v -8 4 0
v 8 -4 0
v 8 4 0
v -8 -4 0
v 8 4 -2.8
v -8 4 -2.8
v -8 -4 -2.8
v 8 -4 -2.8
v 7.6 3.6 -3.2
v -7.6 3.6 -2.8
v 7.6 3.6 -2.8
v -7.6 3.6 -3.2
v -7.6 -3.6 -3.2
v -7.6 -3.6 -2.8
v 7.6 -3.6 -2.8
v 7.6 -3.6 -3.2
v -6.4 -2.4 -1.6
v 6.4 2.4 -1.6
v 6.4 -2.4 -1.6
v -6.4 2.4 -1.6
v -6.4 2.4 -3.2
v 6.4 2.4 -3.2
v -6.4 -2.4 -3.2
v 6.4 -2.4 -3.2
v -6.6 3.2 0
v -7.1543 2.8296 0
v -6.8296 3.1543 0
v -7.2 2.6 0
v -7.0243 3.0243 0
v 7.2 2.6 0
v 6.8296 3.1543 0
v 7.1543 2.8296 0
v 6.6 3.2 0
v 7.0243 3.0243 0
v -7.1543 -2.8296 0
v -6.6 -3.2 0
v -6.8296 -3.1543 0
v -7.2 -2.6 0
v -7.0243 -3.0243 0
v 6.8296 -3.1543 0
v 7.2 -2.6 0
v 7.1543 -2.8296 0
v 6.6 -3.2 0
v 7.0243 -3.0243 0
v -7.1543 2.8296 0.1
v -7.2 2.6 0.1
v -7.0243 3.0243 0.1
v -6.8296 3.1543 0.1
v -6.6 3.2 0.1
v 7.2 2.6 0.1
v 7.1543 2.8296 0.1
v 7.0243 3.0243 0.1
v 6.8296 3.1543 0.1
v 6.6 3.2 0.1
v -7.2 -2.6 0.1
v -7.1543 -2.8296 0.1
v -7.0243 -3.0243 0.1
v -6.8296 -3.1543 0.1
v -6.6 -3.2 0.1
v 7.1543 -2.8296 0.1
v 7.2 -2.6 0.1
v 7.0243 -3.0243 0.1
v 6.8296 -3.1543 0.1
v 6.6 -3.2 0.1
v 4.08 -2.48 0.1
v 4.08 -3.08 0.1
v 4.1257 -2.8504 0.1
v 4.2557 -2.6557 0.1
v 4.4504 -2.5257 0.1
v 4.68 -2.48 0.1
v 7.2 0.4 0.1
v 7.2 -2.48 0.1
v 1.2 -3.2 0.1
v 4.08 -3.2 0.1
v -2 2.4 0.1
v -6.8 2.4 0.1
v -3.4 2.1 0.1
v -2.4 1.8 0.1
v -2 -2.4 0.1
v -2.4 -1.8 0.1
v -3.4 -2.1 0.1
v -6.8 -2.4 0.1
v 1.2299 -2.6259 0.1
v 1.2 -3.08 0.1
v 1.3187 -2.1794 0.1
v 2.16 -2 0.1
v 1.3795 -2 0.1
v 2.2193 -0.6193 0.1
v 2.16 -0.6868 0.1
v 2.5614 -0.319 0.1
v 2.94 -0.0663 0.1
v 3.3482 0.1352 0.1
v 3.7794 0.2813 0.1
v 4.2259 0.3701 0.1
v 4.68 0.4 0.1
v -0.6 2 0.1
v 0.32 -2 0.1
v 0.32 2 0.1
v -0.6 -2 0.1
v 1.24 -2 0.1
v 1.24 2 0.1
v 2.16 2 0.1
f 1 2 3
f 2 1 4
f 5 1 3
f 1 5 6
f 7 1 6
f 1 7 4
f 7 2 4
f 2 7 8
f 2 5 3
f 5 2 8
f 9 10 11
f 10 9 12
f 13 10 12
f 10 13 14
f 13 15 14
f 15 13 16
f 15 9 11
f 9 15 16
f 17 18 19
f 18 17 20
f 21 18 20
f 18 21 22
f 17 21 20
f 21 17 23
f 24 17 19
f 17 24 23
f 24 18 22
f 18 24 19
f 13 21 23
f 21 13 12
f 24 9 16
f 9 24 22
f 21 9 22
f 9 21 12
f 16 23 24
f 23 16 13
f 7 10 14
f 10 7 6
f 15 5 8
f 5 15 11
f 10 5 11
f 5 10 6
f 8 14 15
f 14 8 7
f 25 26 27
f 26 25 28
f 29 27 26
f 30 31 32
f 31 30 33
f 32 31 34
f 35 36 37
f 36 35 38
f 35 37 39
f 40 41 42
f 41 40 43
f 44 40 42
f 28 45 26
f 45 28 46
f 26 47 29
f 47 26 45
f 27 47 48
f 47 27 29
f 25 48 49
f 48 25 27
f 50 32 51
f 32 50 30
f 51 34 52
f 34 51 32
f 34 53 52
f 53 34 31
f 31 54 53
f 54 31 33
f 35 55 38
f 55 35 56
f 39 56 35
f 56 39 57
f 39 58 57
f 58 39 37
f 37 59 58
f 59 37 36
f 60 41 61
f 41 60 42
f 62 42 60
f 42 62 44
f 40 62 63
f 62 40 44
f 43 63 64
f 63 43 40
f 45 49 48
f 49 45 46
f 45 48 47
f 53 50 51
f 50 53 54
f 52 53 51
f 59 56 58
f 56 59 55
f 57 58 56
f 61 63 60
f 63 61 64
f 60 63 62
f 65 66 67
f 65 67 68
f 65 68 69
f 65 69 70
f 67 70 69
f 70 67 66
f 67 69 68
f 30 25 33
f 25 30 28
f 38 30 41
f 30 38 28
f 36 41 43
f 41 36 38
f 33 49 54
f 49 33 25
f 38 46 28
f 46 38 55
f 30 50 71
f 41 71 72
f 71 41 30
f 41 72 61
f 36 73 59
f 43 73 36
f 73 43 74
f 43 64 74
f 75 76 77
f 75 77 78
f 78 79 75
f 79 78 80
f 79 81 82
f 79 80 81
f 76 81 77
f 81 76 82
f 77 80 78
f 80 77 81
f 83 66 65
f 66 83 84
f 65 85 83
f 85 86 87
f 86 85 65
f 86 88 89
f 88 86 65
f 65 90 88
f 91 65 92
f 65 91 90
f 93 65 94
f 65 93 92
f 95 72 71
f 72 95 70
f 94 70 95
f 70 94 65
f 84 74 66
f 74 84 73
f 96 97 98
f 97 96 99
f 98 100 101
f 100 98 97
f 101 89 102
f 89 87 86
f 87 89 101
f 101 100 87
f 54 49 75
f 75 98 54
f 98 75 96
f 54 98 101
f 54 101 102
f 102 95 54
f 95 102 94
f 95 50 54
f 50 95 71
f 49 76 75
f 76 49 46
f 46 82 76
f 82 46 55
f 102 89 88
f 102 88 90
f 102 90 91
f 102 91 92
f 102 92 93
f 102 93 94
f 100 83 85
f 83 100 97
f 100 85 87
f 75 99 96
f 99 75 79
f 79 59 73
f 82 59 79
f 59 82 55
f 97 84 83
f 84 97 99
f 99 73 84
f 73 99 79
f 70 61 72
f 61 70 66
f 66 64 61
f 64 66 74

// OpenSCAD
// file: ../p/box5.scad
use <../lib.scad>
function ldraw_lib__box5() = [
// 0 Box with 5 Faces and All Edges
// 0 Name: box5.dat
// 0 Author: James Jessiman
// 0 !LDRAW_ORG Primitive UPDATE 2012-01
// 0 !LICENSE Licensed under CC BY 4.0 : see CAreadme.txt
// 
// 0 BFC CERTIFY CCW
  [0,"BFC","CERTIFY"],
  [0,"BFC","CCW"],
// 
// 0 !HISTORY 2002-04-03 [sbliss] Modified for BFC compliance
// 0 !HISTORY 2002-04-25 [PTadmin] Official Update 2002-02
// 0 !HISTORY 2007-06-24 [PTadmin] Header formatted for Contributor Agreement
// 0 !HISTORY 2008-07-01 [PTadmin] Official Update 2008-01
// 0 !HISTORY 2012-02-16 [Philo] Changed to CCW
// 0 !HISTORY 2012-03-30 [PTadmin] Official Update 2012-01
// 
// 
// 2 24 1 1 1 -1 1 1
  [2,24,1,1,1,-1,1,1],
// 2 24 -1 1 1 -1 1 -1
  [2,24,-1,1,1,-1,1,-1],
// 2 24 -1 1 -1 1 1 -1
  [2,24,-1,1,-1,1,1,-1],
// 2 24 1 1 -1 1 1 1
  [2,24,1,1,-1,1,1,1],
// 2 24 1 0 1 -1 0 1
  [2,24,1,0,1,-1,0,1],
// 2 24 -1 0 1 -1 0 -1
  [2,24,-1,0,1,-1,0,-1],
// 2 24 -1 0 -1 1 0 -1
  [2,24,-1,0,-1,1,0,-1],
// 2 24 1 0 -1 1 0 1
  [2,24,1,0,-1,1,0,1],
// 2 24 1 0 1 1 1 1
  [2,24,1,0,1,1,1,1],
// 2 24 -1 0 1 -1 1 1
  [2,24,-1,0,1,-1,1,1],
// 2 24 1 0 -1 1 1 -1
  [2,24,1,0,-1,1,1,-1],
// 2 24 -1 0 -1 -1 1 -1
  [2,24,-1,0,-1,-1,1,-1],
// 4 16 -1 1 1 1 1 1 1 1 -1 -1 1 -1
  [4,16,-1,1,1,1,1,1,1,1,-1,-1,1,-1],
// 4 16 -1 1 1 -1 0 1 1 0 1 1 1 1
  [4,16,-1,1,1,-1,0,1,1,0,1,1,1,1],
// 4 16 -1 1 -1 -1 0 -1 -1 0 1 -1 1 1
  [4,16,-1,1,-1,-1,0,-1,-1,0,1,-1,1,1],
// 4 16 1 1 -1 1 0 -1 -1 0 -1 -1 1 -1
  [4,16,1,1,-1,1,0,-1,-1,0,-1,-1,1,-1],
// 4 16 1 1 1 1 0 1 1 0 -1 1 1 -1
  [4,16,1,1,1,1,0,1,1,0,-1,1,1,-1],
];
module ldraw_lib__box5(step=0, col=false, unit=2/5, alt=false, line=0.2, solid=!$preview)
    makepoly(ldraw_lib__box5(), step=step, col=col, unit=unit, alt=alt, line=line, solid=solid);
ldraw_lib__box5(line=0.2);
// file: ../p/box4.scad
use <../lib.scad>
function ldraw_lib__box4() = [
// 0 Box with 4 Faces (2 Parallel Pairs) and All Edges
// 0 Name: box4.dat
// 0 Author: James Jessiman
// 0 !LDRAW_ORG Primitive UPDATE 2012-01
// 0 !LICENSE Licensed under CC BY 4.0 : see CAreadme.txt
// 
// 0 BFC CERTIFY CCW
  [0,"BFC","CERTIFY"],
  [0,"BFC","CCW"],
// 
// 0 !HISTORY 2002-04-03 [sbliss] Modified for BFC compliance
// 0 !HISTORY 2002-04-25 [PTadmin] Official Update 2002-02
// 0 !HISTORY 2007-06-24 [PTadmin] Header formatted for Contributor Agreement
// 0 !HISTORY 2008-07-01 [PTadmin] Official Update 2008-01
// 0 !HISTORY 2012-02-16 [Philo] Changed to CCW
// 0 !HISTORY 2012-03-30 [PTadmin] Official Update 2012-01
// 
// 
// 2 24 1 1 1 -1 1 1
  [2,24,1,1,1,-1,1,1],
// 2 24 -1 1 1 -1 1 -1
  [2,24,-1,1,1,-1,1,-1],
// 2 24 -1 1 -1 1 1 -1
  [2,24,-1,1,-1,1,1,-1],
// 2 24 1 1 -1 1 1 1
  [2,24,1,1,-1,1,1,1],
// 2 24 1 0 1 -1 0 1
  [2,24,1,0,1,-1,0,1],
// 2 24 -1 0 1 -1 0 -1
  [2,24,-1,0,1,-1,0,-1],
// 2 24 -1 0 -1 1 0 -1
  [2,24,-1,0,-1,1,0,-1],
// 2 24 1 0 -1 1 0 1
  [2,24,1,0,-1,1,0,1],
// 2 24 1 0 1 1 1 1
  [2,24,1,0,1,1,1,1],
// 2 24 -1 0 1 -1 1 1
  [2,24,-1,0,1,-1,1,1],
// 2 24 1 0 -1 1 1 -1
  [2,24,1,0,-1,1,1,-1],
// 2 24 -1 0 -1 -1 1 -1
  [2,24,-1,0,-1,-1,1,-1],
// 4 16 -1 1 1 -1 0 1 1 0 1 1 1 1
  [4,16,-1,1,1,-1,0,1,1,0,1,1,1,1],
// 4 16 -1 1 -1 -1 0 -1 -1 0 1 -1 1 1
  [4,16,-1,1,-1,-1,0,-1,-1,0,1,-1,1,1],
// 4 16 1 1 -1 1 0 -1 -1 0 -1 -1 1 -1
  [4,16,1,1,-1,1,0,-1,-1,0,-1,-1,1,-1],
// 4 16 1 1 1 1 0 1 1 0 -1 1 1 -1
  [4,16,1,1,1,1,0,1,1,0,-1,1,1,-1],
];
module ldraw_lib__box4(step=0, col=false, unit=2/5, alt=false, line=0.2, solid=!$preview)
    makepoly(ldraw_lib__box4(), step=step, col=col, unit=unit, alt=alt, line=line, solid=solid);
ldraw_lib__box4(line=0.2);
// file: ../p/1-4ndis.scad
use <../lib.scad>
function ldraw_lib__1_4ndis() = [
// 0 Disc Negative 0.25
// 0 Name: 1-4ndis.dat
// 0 Author: James Jessiman
// 0 !LDRAW_ORG Primitive UPDATE 2012-01
// 0 !LICENSE Licensed under CC BY 4.0 : see CAreadme.txt
// 
// 0 BFC CERTIFY CCW
  [0,"BFC","CERTIFY"],
  [0,"BFC","CCW"],
// 
// 0 !HISTORY 2002-03-23 [sbliss] Added BFC Statement
// 0 !HISTORY 2002-04-25 [PTadmin] Official Update 2002-02
// 0 !HISTORY 2007-06-22 [PTadmin] Header formatted for Contributor Agreement
// 0 !HISTORY 2008-07-01 [PTadmin] Official Update 2008-01
// 0 !HISTORY 2012-02-16 [Philo] Changed to CCW
// 0 !HISTORY 2012-03-30 [PTadmin] Official Update 2012-01
// 
// 
// 3 16 0.9239 0 0.3827 1 0 0 1 0 1
  [3,16,0.9239,0,0.3827,1,0,0,1,0,1],
// 3 16 0.7071 0 0.7071 0.9239 0 0.3827 1 0 1
  [3,16,0.7071,0,0.7071,0.9239,0,0.3827,1,0,1],
// 3 16 0.3827 0 0.9239 0.7071 0 0.7071 1 0 1
  [3,16,0.3827,0,0.9239,0.7071,0,0.7071,1,0,1],
// 3 16 0 0 1 0.3827 0 0.9239 1 0 1
  [3,16,0,0,1,0.3827,0,0.9239,1,0,1],
];
module ldraw_lib__1_4ndis(step=0, col=false, unit=2/5, alt=false, line=0.2, solid=!$preview)
    makepoly(ldraw_lib__1_4ndis(), step=step, col=col, unit=unit, alt=alt, line=line, solid=solid);
ldraw_lib__1_4ndis(line=0.2);
// file: ../p/1-4cyli.scad
use <../lib.scad>
function ldraw_lib__1_4cyli() = [
// 0 Cylinder 0.25
// 0 Name: 1-4cyli.dat
// 0 Author: James Jessiman
// 0 !LDRAW_ORG Primitive UPDATE 2012-01
// 0 !LICENSE Licensed under CC BY 4.0 : see CAreadme.txt
// 
// 0 BFC CERTIFY CCW
  [0,"BFC","CERTIFY"],
  [0,"BFC","CCW"],
// 
// 0 !HISTORY 2002-03-23 [sbliss] Added BFC statement.
// 0 !HISTORY 2002-04-25 [PTadmin] Official Update 2002-02
// 0 !HISTORY 2007-06-22 [PTadmin] Header formatted for Contributor Agreement
// 0 !HISTORY 2008-07-01 [PTadmin] Official Update 2008-01
// 0 !HISTORY 2012-02-16 [Philo] Changed to CCW
// 0 !HISTORY 2012-03-30 [PTadmin] Official Update 2012-01
// 
// 
// 4 16 1 1 0 0.9239 1 0.3827 0.9239 0 0.3827 1 0 0
  [4,16,1,1,0,0.9239,1,0.3827,0.9239,0,0.3827,1,0,0],
// 5 24 1 0 0 1 1 0 0.9239 0 0.3827 1 0 -1
  [5,24,1,0,0,1,1,0,0.9239,0,0.3827,1,0,-1],
// 4 16 0.9239 1 0.3827 0.7071 1 0.7071 0.7071 0 0.7071 0.9239 0 0.3827
  [4,16,0.9239,1,0.3827,0.7071,1,0.7071,0.7071,0,0.7071,0.9239,0,0.3827],
// 5 24 0.9239 0 0.3827 0.9239 1 0.3827 0.7071 0 0.7071 1 0 0
  [5,24,0.9239,0,0.3827,0.9239,1,0.3827,0.7071,0,0.7071,1,0,0],
// 4 16 0.7071 1 0.7071 0.3827 1 0.9239 0.3827 0 0.9239 0.7071 0 0.7071
  [4,16,0.7071,1,0.7071,0.3827,1,0.9239,0.3827,0,0.9239,0.7071,0,0.7071],
// 5 24 0.7071 0 0.7071 0.7071 1 0.7071 0.3827 0 0.9239 0.9239 0 0.3827
  [5,24,0.7071,0,0.7071,0.7071,1,0.7071,0.3827,0,0.9239,0.9239,0,0.3827],
// 4 16 0.3827 1 0.9239 0 1 1 0 0 1 0.3827 0 0.9239
  [4,16,0.3827,1,0.9239,0,1,1,0,0,1,0.3827,0,0.9239],
// 5 24 0.3827 0 0.9239 0.3827 1 0.9239 0 0 1 0.7071 0 0.7071
  [5,24,0.3827,0,0.9239,0.3827,1,0.9239,0,0,1,0.7071,0,0.7071],
// 5 24 0 0 1 0 1 1 0.3827 0 0.9239 -1 0 1
  [5,24,0,0,1,0,1,1,0.3827,0,0.9239,-1,0,1],
];
module ldraw_lib__1_4cyli(step=0, col=false, unit=2/5, alt=false, line=0.2, solid=!$preview)
    makepoly(ldraw_lib__1_4cyli(), step=step, col=col, unit=unit, alt=alt, line=line, solid=solid);
ldraw_lib__1_4cyli(line=0.2);
// file: ../p/1-4chrd.scad
use <../lib.scad>
function ldraw_lib__1_4chrd() = [
// 0 Chord 0.25
// 0 Name: 1-4chrd.dat
// 0 Author: Max Martin Richter [MMR1988]
// 0 !LDRAW_ORG Primitive UPDATE 2023-05
// 0 !LICENSE Licensed under CC BY 4.0 : see CAreadme.txt
// 
// 0 BFC CERTIFY CCW
  [0,"BFC","CERTIFY"],
  [0,"BFC","CCW"],
// 
// 0 !HISTORY 2004-04-22 [PTadmin] Official Update 2004-02
// 0 !HISTORY 2007-10-09 [PTadmin] Header formatted for Contributor Agreement
// 0 !HISTORY 2008-07-01 [PTadmin] Official Update 2008-01
// 0 !HISTORY 2012-08-02 [MMR1988] Re-creation with PrimGen2 and Rectifier
// 0 !HISTORY 2012-08-09 [PTadmin] Official Update 2012-02
// 0 !HISTORY 2023-10-27 [OrionP] Change author to MMR1988 from hafhead
// 0 !HISTORY 2023-10-31 [OrionP] Official Update 2023-05
// 
// 4 16 0.9239 0 0.3827 0.3827 0 0.9239 0 0 1 1 0 0
  [4,16,0.9239,0,0.3827,0.3827,0,0.9239,0,0,1,1,0,0],
// 3 16 0.7071 0 0.7071 0.3827 0 0.9239 0.9239 0 0.3827
  [3,16,0.7071,0,0.7071,0.3827,0,0.9239,0.9239,0,0.3827],
];
module ldraw_lib__1_4chrd(step=0, col=false, unit=2/5, alt=false, line=0.2, solid=!$preview)
    makepoly(ldraw_lib__1_4chrd(), step=step, col=col, unit=unit, alt=alt, line=line, solid=solid);
ldraw_lib__1_4chrd(line=0.2);
// file: s/3069bs01.scad
use <../../lib.scad>
use <../../p/box4.scad>
use <../../p/box5.scad>
function ldraw_lib__s__3069bs01() = [
// 0 ~Tile  1 x  2 with Groove without Top Face
// 0 Name: s\3069bs01.dat
// 0 Author: Santeri Piippo [arezey]
// 0 !LDRAW_ORG Subpart UPDATE 2010-02
// 0 !LICENSE Licensed under CC BY 4.0 : see CAreadme.txt
// 
// 0 BFC CERTIFY CCW
  [0,"BFC","CERTIFY"],
  [0,"BFC","CCW"],
// 
// 0 !HISTORY 2010-07-05 [PTadmin] Official Update 2010-02
// 
// 
// 1 16 0 0 0 20 0 0 0 7 0 0 0 10 box4.dat
  [1,16,0,0,0,20,0,0,0,7,0,0,0,10, ldraw_lib__box4()],
// 1 16 0 7 0 19 0 0 0 1 0 0 0 9 box4.dat
  [1,16,0,7,0,19,0,0,0,1,0,0,0,9, ldraw_lib__box4()],
// 0 BFC INVERTNEXT
  [0,"BFC","INVERTNEXT"],
// 1 16 0 8 0 16 0 0 0 -4 0 0 0 6 box5.dat
  [1,16,0,8,0,16,0,0,0,-4,0,0,0,6, ldraw_lib__box5()],
// 4 16 -19 8 9 -16 8 6 -16 8 -6 -19 8 -9
  [4,16,-19,8,9,-16,8,6,-16,8,-6,-19,8,-9],
// 4 16 19 8 -9 16 8 -6 16 8 6 19 8 9
  [4,16,19,8,-9,16,8,-6,16,8,6,19,8,9],
// 4 16 19 8 9 16 8 6 -16 8 6 -19 8 9
  [4,16,19,8,9,16,8,6,-16,8,6,-19,8,9],
// 4 16 -19 8 -9 -16 8 -6 16 8 -6 19 8 -9
  [4,16,-19,8,-9,-16,8,-6,16,8,-6,19,8,-9],
// 4 16 -20 7 10 -19 7 9 -19 7 -9 -20 7 -10
  [4,16,-20,7,10,-19,7,9,-19,7,-9,-20,7,-10],
// 4 16 20 7 -10 19 7 -9 19 7 9 20 7 10
  [4,16,20,7,-10,19,7,-9,19,7,9,20,7,10],
// 4 16 20 7 10 19 7 9 -19 7 9 -20 7 10
  [4,16,20,7,10,19,7,9,-19,7,9,-20,7,10],
// 4 16 -20 7 -10 -19 7 -9 19 7 -9 20 7 -10
  [4,16,-20,7,-10,-19,7,-9,19,7,-9,20,7,-10],
// 0 //
];
module ldraw_lib__s__3069bs01(step=0, col=false, unit=2/5, alt=false, line=0.2, solid=!$preview)
    makepoly(ldraw_lib__s__3069bs01(), step=step, col=col, unit=unit, alt=alt, line=line, solid=solid);
ldraw_lib__s__3069bs01(line=0.2);
// file: 3069b.scad
use <../lib.scad>
use <s/3069bs01.scad>
function ldraw_lib__3069b() = [
// 0 Tile  1 x  2 with Groove
// 0 Name: 3069b.dat
// 0 Author: Santeri Piippo [arezey]
// 0 !LDRAW_ORG Part UPDATE 2010-02
// 0 !LICENSE Licensed under CC BY 4.0 : see CAreadme.txt
// 
// 0 BFC CERTIFY CCW
  [0,"BFC","CERTIFY"],
  [0,"BFC","CCW"],
// 
// 0 !KEYWORDS BrickLink 3069
// 
// 0 !HISTORY 2010-07-05 [PTadmin] Official Update 2010-02
// 
// 
// 4 16 20 0 -10 20 0 10 -20 0 10 -20 0 -10
  [4,16,20,0,-10,20,0,10,-20,0,10,-20,0,-10],
// 1 16 0 0 0 1 0 0 0 1 0 0 0 1 s\3069bs01.dat
  [1,16,0,0,0,1,0,0,0,1,0,0,0,1, ldraw_lib__s__3069bs01()],
// 0 //
];
module ldraw_lib__3069b(step=0, col=false, unit=2/5, alt=false, line=0.2, solid=!$preview)
    makepoly(ldraw_lib__3069b(), step=step, col=col, unit=unit, alt=alt, line=line, solid=solid);
ldraw_lib__3069b(line=0.2);
// main file
use <../lib.scad>
use <3069b.scad>
use <6148328bk.scad>
function ldraw_lib__3069bd2e() = [
// 0 Tile  1 x  2 with Dark Grey Lines and German Flag on White Background Sticker
// 0 Name: 3069bd2e.dat
// 0 Author: Magnus Forsberg [MagFors]
// 0 !LDRAW_ORG Shortcut UPDATE 2026-05
// 0 !LICENSE Licensed under CC BY 4.0 : see CAreadme.txt
// 
// 0 BFC CERTIFY CCW
  [0,"BFC","CERTIFY"],
  [0,"BFC","CCW"],
// 
// 0 !CATEGORY Sticker Shortcut
// 
// 0 !KEYWORDS Bricklink 3069pb0682L, Porsche 919 Hybrid and 917K Pit Lane
// 0 !KEYWORDS set 75876, Speed Champions, Wheel arch ventilation
// 
// 0 !HISTORY 2026-05-31 [OrionP] Official Update 2026-05
// 
// 1 16 0 0 0 1 0 0 0 1 0 0 0 1 3069b.dat
  [1,16,0,0,0,1,0,0,0,1,0,0,0,1, ldraw_lib__3069b()],
// 1 16 0 0 0 1 0 0 0 1 0 0 0 1 6148328bk.dat
  [1,16,0,0,0,1,0,0,0,1,0,0,0,1, ldraw_lib__6148328bk()],
];
module ldraw_lib__3069bd2e(step=0, col=false, unit=2/5, alt=false, line=0.2, solid=!$preview)
    makepoly(ldraw_lib__3069bd2e(), step=step, col=col, unit=unit, alt=alt, line=line, solid=solid);
ldraw_lib__3069bd2e(line=0.2);
